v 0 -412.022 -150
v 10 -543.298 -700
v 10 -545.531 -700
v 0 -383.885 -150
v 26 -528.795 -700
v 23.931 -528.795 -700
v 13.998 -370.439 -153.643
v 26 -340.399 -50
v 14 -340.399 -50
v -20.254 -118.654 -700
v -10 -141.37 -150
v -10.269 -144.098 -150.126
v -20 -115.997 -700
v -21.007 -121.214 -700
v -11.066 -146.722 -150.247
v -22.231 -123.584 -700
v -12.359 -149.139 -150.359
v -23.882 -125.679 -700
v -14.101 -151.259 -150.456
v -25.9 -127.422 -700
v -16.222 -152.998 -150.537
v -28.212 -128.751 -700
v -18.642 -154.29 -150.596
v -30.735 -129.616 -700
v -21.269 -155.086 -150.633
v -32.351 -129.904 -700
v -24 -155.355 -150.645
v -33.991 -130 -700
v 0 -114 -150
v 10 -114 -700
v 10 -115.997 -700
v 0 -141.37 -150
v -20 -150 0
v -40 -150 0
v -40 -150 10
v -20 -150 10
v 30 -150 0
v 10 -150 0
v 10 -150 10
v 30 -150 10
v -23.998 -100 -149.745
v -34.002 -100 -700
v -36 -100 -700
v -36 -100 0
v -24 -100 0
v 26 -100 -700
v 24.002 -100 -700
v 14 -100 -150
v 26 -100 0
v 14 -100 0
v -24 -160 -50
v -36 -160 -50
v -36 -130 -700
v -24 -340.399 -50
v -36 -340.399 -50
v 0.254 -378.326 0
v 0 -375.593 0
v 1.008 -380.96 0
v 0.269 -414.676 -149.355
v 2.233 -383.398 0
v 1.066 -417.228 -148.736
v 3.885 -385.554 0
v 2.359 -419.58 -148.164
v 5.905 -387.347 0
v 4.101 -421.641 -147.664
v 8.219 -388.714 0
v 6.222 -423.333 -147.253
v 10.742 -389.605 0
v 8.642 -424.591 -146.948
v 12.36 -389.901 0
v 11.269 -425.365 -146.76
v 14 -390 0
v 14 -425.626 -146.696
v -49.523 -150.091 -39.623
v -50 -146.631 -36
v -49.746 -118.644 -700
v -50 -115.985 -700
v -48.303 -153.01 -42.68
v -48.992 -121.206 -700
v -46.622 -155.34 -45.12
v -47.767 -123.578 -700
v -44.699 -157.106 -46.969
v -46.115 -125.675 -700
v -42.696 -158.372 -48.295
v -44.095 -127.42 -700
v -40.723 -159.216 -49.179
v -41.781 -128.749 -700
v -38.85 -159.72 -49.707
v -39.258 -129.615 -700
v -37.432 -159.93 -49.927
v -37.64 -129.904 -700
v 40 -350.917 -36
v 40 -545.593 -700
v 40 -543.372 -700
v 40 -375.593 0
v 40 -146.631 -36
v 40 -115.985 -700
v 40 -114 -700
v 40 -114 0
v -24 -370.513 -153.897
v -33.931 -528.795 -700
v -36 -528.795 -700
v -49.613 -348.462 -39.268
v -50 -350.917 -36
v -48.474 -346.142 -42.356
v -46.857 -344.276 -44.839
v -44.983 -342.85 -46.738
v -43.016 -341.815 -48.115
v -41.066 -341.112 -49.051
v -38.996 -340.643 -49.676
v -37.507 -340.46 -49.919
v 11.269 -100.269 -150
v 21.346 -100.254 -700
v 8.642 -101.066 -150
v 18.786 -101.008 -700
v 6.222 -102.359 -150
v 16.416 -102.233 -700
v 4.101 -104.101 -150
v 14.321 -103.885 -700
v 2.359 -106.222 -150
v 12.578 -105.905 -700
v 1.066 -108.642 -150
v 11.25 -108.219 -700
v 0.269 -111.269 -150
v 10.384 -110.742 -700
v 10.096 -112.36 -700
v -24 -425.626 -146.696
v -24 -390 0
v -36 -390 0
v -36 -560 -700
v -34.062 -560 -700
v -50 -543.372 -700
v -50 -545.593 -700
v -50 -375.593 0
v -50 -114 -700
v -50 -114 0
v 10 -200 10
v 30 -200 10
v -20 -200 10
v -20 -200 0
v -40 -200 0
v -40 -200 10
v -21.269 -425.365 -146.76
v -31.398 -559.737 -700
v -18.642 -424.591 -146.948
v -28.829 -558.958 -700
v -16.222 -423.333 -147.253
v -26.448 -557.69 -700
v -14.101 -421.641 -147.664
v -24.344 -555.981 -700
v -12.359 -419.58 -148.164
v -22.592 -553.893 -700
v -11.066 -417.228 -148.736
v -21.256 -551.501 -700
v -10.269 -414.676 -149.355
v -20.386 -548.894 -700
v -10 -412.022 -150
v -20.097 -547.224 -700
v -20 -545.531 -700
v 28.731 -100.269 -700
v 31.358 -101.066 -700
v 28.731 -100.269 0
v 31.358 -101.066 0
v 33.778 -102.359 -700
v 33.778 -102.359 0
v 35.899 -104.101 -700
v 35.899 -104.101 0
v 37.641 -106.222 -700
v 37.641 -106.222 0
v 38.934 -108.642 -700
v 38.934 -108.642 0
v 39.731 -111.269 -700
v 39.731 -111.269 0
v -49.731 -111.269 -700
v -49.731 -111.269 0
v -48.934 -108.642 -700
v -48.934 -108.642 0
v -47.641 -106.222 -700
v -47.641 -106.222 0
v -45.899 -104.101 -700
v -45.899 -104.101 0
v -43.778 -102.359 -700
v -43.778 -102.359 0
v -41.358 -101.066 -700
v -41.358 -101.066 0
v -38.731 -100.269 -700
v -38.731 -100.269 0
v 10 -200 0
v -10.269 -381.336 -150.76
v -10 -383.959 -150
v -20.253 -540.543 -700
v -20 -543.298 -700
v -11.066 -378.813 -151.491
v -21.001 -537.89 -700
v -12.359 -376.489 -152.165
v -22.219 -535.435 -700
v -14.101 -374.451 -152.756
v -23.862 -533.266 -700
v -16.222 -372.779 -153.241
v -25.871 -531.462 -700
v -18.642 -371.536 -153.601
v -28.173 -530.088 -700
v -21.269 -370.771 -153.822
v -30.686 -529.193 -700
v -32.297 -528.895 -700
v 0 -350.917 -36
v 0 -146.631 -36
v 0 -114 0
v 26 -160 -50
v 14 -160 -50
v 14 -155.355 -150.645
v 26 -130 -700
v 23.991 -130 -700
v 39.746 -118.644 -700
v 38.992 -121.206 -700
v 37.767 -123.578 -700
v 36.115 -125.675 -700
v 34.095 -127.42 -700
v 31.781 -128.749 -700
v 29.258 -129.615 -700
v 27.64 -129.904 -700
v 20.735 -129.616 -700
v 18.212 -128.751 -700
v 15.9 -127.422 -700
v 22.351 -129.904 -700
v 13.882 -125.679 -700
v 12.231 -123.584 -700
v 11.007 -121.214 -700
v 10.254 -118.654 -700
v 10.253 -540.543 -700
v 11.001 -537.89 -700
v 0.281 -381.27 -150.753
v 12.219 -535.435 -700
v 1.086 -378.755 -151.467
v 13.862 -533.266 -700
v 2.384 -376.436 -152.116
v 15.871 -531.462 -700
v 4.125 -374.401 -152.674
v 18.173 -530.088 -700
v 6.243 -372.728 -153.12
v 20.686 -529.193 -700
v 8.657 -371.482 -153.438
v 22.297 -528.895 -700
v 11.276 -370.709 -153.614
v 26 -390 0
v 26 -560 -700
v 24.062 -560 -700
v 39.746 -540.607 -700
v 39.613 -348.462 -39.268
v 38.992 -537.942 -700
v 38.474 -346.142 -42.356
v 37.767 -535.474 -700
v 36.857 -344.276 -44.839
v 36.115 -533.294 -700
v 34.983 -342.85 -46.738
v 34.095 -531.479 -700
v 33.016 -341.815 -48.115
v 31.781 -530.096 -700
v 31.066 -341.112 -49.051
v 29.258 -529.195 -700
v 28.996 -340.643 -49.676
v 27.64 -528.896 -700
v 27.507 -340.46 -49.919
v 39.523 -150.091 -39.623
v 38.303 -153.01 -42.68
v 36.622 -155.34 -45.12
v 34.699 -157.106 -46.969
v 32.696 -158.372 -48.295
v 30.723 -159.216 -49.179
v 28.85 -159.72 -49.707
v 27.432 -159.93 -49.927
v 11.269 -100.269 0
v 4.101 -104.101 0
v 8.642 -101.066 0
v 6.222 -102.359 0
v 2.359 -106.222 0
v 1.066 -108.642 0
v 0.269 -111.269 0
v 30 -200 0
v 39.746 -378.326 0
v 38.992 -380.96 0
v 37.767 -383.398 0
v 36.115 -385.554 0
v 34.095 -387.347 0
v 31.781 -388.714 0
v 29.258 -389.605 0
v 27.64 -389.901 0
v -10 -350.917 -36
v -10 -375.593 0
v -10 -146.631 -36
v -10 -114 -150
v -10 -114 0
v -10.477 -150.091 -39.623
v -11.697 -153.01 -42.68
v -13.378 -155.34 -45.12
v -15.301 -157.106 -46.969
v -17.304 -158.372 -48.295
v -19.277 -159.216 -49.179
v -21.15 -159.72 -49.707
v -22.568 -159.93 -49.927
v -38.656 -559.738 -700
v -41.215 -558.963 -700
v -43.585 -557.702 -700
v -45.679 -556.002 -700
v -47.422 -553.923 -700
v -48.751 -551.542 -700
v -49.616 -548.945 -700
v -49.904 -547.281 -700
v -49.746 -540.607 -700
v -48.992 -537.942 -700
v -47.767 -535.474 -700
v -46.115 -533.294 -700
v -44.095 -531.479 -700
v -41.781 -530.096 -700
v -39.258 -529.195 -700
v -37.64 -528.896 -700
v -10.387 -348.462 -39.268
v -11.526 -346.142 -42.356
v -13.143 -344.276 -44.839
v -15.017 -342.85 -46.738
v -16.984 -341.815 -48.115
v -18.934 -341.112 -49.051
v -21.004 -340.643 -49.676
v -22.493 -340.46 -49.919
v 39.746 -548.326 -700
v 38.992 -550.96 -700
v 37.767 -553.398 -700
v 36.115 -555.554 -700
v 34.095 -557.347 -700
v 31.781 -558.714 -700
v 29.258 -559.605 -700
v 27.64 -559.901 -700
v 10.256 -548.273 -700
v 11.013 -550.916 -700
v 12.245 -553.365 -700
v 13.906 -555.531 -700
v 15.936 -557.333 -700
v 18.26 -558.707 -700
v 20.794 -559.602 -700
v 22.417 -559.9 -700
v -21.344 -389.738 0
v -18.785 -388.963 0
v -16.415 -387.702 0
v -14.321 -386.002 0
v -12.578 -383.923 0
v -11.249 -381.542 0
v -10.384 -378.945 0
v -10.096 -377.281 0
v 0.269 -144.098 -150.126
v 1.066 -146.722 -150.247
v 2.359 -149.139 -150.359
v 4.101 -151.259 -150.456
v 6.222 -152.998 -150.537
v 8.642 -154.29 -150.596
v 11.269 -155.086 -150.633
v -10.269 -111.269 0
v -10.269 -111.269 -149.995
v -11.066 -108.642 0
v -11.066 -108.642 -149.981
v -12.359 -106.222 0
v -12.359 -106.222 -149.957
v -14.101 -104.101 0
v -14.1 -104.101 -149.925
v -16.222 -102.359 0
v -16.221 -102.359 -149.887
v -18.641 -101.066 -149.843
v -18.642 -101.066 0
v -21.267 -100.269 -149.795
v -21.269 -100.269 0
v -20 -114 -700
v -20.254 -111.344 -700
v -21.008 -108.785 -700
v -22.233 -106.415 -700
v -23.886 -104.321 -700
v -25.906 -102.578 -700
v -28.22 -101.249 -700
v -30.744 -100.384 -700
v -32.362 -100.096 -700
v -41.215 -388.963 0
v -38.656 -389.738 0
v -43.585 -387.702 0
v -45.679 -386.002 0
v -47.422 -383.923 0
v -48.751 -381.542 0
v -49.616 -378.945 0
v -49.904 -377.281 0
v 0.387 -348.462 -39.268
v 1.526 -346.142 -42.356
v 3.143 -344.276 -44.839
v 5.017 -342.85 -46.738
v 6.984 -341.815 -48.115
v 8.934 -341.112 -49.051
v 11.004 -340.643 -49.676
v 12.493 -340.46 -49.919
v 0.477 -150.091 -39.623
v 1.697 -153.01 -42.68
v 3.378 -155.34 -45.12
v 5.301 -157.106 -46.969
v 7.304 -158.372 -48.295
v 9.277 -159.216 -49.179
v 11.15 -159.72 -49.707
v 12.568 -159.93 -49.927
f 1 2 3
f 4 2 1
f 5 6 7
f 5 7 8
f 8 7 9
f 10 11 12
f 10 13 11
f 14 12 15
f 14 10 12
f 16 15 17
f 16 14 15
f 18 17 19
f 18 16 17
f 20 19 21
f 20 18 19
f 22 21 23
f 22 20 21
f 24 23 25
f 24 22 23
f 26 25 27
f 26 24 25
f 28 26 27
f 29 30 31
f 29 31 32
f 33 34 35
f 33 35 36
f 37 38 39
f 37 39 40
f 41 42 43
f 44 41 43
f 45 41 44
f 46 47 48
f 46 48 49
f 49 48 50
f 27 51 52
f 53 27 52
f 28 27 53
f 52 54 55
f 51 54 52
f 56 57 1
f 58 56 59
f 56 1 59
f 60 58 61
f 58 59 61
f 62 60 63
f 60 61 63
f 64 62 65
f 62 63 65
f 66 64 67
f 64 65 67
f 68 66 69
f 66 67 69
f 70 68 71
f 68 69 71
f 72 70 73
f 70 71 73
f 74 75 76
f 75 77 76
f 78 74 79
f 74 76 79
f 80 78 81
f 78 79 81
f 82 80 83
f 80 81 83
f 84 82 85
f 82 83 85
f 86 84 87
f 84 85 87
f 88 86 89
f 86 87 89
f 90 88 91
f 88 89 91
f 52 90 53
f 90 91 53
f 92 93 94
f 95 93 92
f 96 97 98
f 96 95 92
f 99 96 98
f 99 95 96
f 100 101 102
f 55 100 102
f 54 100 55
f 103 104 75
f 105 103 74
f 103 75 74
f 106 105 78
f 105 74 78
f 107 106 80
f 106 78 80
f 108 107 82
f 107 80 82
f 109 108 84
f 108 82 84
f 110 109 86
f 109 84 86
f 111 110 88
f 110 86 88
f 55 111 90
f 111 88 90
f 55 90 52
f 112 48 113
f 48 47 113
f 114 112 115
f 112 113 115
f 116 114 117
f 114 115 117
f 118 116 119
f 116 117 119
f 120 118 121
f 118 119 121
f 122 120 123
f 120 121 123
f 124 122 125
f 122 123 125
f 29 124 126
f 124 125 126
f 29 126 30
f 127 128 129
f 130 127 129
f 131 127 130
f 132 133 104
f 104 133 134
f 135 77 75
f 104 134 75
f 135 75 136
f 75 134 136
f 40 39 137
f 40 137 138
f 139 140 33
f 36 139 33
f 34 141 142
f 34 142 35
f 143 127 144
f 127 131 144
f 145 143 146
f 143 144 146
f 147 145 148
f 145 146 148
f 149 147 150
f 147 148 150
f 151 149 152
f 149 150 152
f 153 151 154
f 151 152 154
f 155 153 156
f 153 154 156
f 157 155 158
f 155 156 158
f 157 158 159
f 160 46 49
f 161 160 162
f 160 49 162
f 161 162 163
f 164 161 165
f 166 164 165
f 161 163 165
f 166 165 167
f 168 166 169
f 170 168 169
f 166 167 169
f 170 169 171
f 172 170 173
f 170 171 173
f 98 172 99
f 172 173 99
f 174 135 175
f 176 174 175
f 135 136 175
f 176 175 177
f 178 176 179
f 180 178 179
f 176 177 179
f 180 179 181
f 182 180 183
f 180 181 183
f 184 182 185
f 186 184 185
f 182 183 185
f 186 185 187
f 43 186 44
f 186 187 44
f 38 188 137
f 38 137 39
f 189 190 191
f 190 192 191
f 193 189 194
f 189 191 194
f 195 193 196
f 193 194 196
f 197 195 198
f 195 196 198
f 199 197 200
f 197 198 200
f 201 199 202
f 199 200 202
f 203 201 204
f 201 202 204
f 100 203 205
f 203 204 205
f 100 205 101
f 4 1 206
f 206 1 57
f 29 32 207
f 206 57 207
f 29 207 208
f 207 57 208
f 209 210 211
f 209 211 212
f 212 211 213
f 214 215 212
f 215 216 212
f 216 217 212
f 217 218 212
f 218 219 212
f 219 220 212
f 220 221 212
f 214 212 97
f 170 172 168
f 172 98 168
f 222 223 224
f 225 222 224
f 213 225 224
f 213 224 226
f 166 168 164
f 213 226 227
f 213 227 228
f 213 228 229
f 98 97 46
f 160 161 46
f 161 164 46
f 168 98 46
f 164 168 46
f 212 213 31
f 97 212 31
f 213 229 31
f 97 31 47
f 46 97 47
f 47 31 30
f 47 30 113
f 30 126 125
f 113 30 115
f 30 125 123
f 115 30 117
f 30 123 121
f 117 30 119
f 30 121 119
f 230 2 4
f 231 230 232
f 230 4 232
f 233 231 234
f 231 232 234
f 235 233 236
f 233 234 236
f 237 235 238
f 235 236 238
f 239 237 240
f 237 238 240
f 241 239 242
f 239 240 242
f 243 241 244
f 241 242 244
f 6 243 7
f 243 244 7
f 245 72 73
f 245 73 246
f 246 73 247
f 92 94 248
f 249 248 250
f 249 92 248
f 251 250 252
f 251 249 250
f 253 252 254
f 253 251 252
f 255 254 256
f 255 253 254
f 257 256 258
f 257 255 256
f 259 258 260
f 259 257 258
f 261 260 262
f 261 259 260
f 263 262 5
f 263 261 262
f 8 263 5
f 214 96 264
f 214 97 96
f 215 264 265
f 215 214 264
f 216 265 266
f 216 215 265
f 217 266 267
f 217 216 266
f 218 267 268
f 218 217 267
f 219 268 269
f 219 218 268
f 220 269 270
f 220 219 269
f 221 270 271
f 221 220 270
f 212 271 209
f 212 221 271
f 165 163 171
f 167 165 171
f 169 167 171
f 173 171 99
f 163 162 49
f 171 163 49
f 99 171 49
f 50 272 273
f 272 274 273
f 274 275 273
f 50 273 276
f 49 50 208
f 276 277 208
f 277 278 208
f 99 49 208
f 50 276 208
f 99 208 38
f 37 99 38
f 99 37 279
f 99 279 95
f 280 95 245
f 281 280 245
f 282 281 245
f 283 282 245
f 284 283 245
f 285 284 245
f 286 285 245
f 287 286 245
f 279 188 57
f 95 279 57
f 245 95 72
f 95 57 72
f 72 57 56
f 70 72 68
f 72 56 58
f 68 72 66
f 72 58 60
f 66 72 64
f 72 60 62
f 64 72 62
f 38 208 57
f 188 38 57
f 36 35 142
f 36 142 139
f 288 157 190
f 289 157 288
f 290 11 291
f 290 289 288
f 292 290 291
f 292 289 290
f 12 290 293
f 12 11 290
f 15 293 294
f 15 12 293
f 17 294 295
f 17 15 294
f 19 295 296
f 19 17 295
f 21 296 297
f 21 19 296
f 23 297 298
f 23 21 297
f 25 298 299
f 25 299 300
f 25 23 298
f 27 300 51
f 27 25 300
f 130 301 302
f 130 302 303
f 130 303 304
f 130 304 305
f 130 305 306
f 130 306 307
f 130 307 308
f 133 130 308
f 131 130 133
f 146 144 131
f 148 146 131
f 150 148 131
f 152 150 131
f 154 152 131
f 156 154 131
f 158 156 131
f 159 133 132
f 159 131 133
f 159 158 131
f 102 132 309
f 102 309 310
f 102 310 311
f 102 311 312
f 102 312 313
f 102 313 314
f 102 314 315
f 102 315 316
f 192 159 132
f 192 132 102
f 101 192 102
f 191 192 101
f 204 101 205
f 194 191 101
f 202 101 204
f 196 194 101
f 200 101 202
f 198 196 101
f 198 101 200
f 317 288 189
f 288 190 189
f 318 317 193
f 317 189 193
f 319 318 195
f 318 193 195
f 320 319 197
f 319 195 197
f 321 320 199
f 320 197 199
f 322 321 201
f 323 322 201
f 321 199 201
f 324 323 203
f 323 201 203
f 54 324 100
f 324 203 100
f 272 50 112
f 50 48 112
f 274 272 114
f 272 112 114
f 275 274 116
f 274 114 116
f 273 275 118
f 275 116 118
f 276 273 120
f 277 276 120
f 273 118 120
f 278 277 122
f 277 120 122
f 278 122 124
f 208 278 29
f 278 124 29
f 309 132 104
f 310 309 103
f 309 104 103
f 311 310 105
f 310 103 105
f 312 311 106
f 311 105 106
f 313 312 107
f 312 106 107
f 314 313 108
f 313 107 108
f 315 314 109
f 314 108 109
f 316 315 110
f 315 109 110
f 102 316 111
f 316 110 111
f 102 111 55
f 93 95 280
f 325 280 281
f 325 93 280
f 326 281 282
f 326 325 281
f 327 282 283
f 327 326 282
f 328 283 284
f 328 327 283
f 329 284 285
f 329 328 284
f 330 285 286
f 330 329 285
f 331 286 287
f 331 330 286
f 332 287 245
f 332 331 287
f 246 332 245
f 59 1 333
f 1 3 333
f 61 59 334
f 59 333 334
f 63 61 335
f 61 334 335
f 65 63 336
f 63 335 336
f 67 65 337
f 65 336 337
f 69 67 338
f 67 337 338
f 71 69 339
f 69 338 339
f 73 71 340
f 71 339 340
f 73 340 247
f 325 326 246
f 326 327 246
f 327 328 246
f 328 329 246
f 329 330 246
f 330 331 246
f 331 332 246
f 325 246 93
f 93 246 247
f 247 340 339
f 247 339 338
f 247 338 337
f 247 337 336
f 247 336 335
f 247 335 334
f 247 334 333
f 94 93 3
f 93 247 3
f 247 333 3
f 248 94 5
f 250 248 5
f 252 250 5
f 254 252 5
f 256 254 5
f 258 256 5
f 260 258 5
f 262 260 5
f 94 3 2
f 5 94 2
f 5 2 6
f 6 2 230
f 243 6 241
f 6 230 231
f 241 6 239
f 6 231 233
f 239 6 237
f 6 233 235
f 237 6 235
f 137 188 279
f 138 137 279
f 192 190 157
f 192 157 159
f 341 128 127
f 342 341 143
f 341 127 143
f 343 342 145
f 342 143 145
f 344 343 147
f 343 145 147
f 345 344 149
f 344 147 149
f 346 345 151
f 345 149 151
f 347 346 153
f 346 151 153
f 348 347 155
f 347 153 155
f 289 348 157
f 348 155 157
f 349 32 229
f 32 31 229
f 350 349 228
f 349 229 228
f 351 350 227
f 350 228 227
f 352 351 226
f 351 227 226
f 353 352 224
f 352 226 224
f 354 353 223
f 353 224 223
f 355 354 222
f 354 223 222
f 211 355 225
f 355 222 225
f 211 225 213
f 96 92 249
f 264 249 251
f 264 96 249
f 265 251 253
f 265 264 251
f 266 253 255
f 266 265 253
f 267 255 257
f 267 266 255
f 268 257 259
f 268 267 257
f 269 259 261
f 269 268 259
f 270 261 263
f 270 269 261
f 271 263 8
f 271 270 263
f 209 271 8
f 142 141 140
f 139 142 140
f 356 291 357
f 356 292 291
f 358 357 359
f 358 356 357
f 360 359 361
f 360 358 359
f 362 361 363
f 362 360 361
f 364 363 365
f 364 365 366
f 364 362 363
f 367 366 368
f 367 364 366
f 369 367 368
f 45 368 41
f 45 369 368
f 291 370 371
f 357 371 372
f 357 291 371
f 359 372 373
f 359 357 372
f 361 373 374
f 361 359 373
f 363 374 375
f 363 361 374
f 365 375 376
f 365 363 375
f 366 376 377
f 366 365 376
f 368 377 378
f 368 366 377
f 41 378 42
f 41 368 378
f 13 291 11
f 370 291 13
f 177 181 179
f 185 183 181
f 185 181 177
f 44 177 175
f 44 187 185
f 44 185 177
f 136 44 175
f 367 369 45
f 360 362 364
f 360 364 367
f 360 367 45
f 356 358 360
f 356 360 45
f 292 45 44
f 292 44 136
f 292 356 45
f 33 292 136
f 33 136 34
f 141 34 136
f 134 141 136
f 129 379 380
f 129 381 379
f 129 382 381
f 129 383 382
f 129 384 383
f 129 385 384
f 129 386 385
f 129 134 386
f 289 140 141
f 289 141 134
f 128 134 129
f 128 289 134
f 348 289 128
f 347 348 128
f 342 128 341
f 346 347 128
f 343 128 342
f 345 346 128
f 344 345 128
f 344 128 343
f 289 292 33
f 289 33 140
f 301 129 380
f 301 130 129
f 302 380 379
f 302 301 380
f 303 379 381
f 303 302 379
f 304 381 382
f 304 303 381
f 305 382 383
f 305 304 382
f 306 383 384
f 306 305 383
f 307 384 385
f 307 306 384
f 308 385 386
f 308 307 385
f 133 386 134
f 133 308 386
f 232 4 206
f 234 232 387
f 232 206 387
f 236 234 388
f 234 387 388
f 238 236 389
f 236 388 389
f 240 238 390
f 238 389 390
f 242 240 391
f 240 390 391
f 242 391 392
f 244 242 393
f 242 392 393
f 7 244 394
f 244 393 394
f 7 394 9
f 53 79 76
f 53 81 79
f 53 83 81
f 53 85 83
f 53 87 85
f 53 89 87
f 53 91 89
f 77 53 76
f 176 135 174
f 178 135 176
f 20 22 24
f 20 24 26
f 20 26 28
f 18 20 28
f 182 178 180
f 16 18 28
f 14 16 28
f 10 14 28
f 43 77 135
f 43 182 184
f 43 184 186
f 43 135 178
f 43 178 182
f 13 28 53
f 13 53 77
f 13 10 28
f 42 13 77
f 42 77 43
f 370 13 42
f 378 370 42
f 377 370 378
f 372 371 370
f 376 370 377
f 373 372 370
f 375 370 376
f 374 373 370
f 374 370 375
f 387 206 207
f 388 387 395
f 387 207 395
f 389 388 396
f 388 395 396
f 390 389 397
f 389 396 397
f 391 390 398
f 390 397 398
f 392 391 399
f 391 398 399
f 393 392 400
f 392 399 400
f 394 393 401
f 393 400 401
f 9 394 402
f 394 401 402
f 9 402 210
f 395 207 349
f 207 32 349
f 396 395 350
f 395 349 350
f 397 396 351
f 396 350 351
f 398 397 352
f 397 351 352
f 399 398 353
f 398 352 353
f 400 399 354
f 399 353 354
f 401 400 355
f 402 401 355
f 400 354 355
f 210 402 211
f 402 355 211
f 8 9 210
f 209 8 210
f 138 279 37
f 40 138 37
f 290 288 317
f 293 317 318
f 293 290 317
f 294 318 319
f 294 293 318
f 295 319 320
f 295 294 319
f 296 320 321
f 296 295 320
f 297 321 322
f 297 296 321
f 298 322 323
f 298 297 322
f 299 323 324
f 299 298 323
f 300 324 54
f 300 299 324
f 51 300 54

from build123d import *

# Parameters (mm, degrees)
F2_DEPTH  = 40
F3_W      = 20
F3_H      = 50
F4_DEPTH  = 10
F7_DEPTH  = 40
F8_W      = 20
F8_H      = 50
F9_DEPTH  = 10
F11_DEPTH = 560.001
F13_DEPTH = 560.001
F14_R     = 14
F14_2_R   = 14


with BuildPart() as f2:
    # F1 (on Right) → F2 (new body)
    with BuildSketch(Plane.YZ):
        Polygon((-100, 0), (-390, 0), (-560, -700), (-528.7953392229, -700), (-340.3988166967, -50), (-160, -50), (-130, -700), (-120, -700), (-100, -700), align=None)
    extrude(amount=F2_DEPTH)

    # F3 (on Top) → F4 (join)
    with BuildSketch(Plane.XY):
        with Locations((20, -175)):
            Rectangle(F3_W, F3_H)
    extrude(amount=F4_DEPTH)


with BuildPart() as f7:
    # F6 (on offset) → F7 (new body)
    with BuildSketch(Plane.YZ.offset(-10)):
        Polygon((-390, 0), (-560, -700), (-545.5930572292, -700), (-543.3715358309, -700), (-528.7953392229, -700), (-340.3988166967, -50), (-160, -50), (-130, -700), (-115.9850966898, -700), (-114, -700), (-100, -700), (-100, 0), align=None)
    extrude(amount=-F7_DEPTH)

    # F8 (on Top) → F9 (join)
    with BuildSketch(Plane.XY):
        with Locations((-30, -175)):
            Rectangle(F8_W, F8_H)
    extrude(amount=F9_DEPTH)


with BuildPart() as f11_tool:
    # F10 (on Front) → F11 (new body, through all)
    with BuildSketch(Plane.XZ):
        Polygon((0, -700), (10, -700), (0, -150), align=None)
        Polygon((-10, -150), (-20, -700), (-10, -700), align=None)
    extrude(amount=F11_DEPTH)


with BuildPart() as f2_1:
    add(f2.part)

    # F11: cut by f11_tool
    add(f11_tool.part, mode=Mode.SUBTRACT)

    # F12 (on Front) → F13 (cut, through all)
    with BuildSketch(Plane.XZ):
        Polygon((0, -150), (0, -700), (10, -700), align=None)
    extrude(amount=F13_DEPTH, mode=Mode.SUBTRACT)

    # F14
    f14_edges = [f2_1.edges().sort_by_distance(p)[0] for p in [
        (40, -434.597078, -375),
        (40, -250.199408, -50),
        (40, -145, -375),
        (40, -475, -350),
        (40, -100, -350),
        (5, -100, -425),
        (0, -100, -75),
        (0, -354.890857, -100),
        (5, -449.089118, -425),
        (0, -250.199408, -50),
        (0, -157.692308, -100),
        (5, -142.692308, -425),
        (0, -408.214286, -75),
        (5, -493.214286, -425),
    ]]
    fillet(f14_edges, radius=F14_R)


with BuildPart() as f7_1:
    add(f7.part)

    # F11: cut by f11_tool
    add(f11_tool.part, mode=Mode.SUBTRACT)

    # F14#2
    f14_2_edges = [f7_1.edges().sort_by_distance(p)[0] for p in [
        (-15, -449.089118, -425),
        (-10, -354.890857, -100),
        (-10, -250.199408, -50),
        (-10, -100, -75),
        (-15, -100, -425),
        (-50, -100, -350),
        (-50, -145, -375),
        (-50, -250.199408, -50),
        (-50, -434.597078, -375),
        (-10, -157.692308, -100),
        (-15, -142.692308, -425),
        (-10, -408.214286, -75),
        (-15, -493.214286, -425),
        (-50, -475, -350),
    ]]
    fillet(f14_2_edges, radius=F14_2_R)


solid = Compound([f2_1.part, f7_1.part])
